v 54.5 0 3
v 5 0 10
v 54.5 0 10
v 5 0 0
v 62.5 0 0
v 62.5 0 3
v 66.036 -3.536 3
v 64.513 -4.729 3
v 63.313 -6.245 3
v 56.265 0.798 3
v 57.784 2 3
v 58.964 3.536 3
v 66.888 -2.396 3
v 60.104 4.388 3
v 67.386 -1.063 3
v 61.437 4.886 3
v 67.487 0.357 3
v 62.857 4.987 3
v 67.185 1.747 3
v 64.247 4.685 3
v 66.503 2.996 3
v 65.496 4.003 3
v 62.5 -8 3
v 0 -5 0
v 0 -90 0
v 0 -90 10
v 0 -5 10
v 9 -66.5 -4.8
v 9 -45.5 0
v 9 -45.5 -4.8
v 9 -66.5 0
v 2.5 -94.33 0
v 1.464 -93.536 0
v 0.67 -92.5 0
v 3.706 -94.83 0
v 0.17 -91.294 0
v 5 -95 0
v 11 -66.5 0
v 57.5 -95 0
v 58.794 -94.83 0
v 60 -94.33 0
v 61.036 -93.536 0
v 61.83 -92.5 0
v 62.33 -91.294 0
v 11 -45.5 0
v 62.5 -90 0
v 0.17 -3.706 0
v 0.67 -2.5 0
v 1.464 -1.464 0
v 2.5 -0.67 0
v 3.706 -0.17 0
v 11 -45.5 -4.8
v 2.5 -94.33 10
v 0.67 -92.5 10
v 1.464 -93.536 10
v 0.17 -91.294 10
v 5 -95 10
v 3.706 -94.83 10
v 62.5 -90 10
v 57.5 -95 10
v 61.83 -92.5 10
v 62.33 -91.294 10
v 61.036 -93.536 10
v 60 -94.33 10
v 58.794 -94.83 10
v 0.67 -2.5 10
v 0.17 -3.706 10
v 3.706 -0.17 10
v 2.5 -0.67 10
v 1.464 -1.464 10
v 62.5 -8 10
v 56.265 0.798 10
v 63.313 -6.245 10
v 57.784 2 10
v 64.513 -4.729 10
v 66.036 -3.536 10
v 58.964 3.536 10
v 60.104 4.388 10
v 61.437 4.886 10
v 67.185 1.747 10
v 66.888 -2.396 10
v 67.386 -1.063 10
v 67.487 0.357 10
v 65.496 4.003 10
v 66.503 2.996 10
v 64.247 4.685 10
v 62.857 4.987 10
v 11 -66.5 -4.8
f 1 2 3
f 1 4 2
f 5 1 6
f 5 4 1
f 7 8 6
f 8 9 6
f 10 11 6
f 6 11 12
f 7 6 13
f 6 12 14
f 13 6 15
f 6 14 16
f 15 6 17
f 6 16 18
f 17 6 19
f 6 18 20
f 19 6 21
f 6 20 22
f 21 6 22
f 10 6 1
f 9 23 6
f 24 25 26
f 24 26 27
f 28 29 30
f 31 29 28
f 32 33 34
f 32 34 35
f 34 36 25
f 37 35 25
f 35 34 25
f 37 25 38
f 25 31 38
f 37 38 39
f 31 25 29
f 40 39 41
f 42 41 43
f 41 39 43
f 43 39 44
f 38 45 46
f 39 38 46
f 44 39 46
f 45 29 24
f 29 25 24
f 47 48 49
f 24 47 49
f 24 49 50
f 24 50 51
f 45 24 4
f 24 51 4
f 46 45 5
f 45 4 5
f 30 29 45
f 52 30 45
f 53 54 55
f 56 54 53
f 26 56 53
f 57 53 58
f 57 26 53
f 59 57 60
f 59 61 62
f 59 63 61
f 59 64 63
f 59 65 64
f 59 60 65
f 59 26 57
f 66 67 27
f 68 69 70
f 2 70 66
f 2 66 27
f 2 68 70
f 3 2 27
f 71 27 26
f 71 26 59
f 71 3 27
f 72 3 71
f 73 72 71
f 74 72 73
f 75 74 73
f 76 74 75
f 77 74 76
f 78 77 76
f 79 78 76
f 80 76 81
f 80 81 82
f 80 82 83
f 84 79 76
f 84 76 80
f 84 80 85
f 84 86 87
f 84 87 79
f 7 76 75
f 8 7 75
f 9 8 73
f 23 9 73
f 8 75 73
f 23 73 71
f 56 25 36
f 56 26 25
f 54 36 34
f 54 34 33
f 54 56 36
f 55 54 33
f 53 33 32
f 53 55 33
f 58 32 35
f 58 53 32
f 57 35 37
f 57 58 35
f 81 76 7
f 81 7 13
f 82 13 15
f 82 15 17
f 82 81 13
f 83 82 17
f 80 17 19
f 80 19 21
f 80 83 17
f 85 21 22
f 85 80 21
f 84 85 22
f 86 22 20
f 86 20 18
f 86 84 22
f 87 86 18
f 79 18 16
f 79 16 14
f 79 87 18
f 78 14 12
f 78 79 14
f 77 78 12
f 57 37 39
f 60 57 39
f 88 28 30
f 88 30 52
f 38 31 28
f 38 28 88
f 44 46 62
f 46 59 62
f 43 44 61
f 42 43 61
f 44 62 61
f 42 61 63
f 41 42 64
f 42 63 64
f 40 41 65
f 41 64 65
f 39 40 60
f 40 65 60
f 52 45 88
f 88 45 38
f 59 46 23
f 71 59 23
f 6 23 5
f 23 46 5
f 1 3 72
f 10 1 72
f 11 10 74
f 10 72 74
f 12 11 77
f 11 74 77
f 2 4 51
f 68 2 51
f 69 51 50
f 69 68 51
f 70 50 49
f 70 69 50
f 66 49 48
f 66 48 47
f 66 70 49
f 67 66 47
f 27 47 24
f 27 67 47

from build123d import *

# Parameters (mm, degrees)
SKETCH_W     = 62.5
SKETCH_H     = 95
PAD_DEPTH    = 10
PAD001_DEPTH = 7
POCKET_DEPTH = 3
SKETCH003_W  = 2
SKETCH003_H  = 21
PAD002_DEPTH = 4.8
FILLET_R     = 5


with BuildPart() as part:
    # Sketch → Pad (new body)
    with BuildSketch(Plane.XY):
        with Locations((31.25, -47.5)):
            Rectangle(SKETCH_W, SKETCH_H)
    extrude(amount=PAD_DEPTH)

    # Sketch001 (on Face6 of Pad) → Pad001 (join)
    with BuildSketch(Plane.XY.offset(10)):
        with BuildLine():
            ThreePointArc((66.035523, -3.535545), (66.035539, 3.535528), (58.964466, 3.535534))
            ThreePointArc((54.5, 0), (57.061192, 1.352376), (58.964466, 3.535534))
            Line((54.5, 0), (62.5, -8))
            ThreePointArc((66.035523, -3.535545), (63.868245, -5.451384), (62.5, -8))
        make_face()
    extrude(amount=-PAD001_DEPTH)

    # Sketch002 (on Face2 of Pad001) → Pocket (cut)
    with BuildSketch(Plane(origin=(0, 0, 0), x_dir=(1, 0, 0), z_dir=(0, 0, -1))):
        with BuildLine():
            Line((54.5, 0), (62.5, 0))
            Line((62.5, 0), (62.5, 8))
            ThreePointArc((62.5, 8), (63.868245, 5.451384), (66.035523, 3.535545))
            ThreePointArc((58.964466, -3.535534), (66.035539, -3.535528), (66.035523, 3.535545))
            ThreePointArc((58.964466, -3.535534), (57.061192, -1.352376), (54.5, 0))
        make_face()
    extrude(amount=-POCKET_DEPTH, mode=Mode.SUBTRACT)

    # Sketch003 (on Face3 of Pocket) → Pad002 (join)
    with BuildSketch(Plane(origin=(0, 0, 0), x_dir=(1, 0, 0), z_dir=(0, 0, -1))):
        with Locations((10, 56)):
            Rectangle(SKETCH003_W, SKETCH003_H)
    extrude(amount=PAD002_DEPTH)

    # Fillet
    fillet_edges = [part.edges().sort_by_distance(p)[0] for p in [
        (0, 0, 5),
        (0, -95, 5),
        (62.5, -95, 5),
    ]]
    fillet(fillet_edges, radius=FILLET_R)


solid = part.part
